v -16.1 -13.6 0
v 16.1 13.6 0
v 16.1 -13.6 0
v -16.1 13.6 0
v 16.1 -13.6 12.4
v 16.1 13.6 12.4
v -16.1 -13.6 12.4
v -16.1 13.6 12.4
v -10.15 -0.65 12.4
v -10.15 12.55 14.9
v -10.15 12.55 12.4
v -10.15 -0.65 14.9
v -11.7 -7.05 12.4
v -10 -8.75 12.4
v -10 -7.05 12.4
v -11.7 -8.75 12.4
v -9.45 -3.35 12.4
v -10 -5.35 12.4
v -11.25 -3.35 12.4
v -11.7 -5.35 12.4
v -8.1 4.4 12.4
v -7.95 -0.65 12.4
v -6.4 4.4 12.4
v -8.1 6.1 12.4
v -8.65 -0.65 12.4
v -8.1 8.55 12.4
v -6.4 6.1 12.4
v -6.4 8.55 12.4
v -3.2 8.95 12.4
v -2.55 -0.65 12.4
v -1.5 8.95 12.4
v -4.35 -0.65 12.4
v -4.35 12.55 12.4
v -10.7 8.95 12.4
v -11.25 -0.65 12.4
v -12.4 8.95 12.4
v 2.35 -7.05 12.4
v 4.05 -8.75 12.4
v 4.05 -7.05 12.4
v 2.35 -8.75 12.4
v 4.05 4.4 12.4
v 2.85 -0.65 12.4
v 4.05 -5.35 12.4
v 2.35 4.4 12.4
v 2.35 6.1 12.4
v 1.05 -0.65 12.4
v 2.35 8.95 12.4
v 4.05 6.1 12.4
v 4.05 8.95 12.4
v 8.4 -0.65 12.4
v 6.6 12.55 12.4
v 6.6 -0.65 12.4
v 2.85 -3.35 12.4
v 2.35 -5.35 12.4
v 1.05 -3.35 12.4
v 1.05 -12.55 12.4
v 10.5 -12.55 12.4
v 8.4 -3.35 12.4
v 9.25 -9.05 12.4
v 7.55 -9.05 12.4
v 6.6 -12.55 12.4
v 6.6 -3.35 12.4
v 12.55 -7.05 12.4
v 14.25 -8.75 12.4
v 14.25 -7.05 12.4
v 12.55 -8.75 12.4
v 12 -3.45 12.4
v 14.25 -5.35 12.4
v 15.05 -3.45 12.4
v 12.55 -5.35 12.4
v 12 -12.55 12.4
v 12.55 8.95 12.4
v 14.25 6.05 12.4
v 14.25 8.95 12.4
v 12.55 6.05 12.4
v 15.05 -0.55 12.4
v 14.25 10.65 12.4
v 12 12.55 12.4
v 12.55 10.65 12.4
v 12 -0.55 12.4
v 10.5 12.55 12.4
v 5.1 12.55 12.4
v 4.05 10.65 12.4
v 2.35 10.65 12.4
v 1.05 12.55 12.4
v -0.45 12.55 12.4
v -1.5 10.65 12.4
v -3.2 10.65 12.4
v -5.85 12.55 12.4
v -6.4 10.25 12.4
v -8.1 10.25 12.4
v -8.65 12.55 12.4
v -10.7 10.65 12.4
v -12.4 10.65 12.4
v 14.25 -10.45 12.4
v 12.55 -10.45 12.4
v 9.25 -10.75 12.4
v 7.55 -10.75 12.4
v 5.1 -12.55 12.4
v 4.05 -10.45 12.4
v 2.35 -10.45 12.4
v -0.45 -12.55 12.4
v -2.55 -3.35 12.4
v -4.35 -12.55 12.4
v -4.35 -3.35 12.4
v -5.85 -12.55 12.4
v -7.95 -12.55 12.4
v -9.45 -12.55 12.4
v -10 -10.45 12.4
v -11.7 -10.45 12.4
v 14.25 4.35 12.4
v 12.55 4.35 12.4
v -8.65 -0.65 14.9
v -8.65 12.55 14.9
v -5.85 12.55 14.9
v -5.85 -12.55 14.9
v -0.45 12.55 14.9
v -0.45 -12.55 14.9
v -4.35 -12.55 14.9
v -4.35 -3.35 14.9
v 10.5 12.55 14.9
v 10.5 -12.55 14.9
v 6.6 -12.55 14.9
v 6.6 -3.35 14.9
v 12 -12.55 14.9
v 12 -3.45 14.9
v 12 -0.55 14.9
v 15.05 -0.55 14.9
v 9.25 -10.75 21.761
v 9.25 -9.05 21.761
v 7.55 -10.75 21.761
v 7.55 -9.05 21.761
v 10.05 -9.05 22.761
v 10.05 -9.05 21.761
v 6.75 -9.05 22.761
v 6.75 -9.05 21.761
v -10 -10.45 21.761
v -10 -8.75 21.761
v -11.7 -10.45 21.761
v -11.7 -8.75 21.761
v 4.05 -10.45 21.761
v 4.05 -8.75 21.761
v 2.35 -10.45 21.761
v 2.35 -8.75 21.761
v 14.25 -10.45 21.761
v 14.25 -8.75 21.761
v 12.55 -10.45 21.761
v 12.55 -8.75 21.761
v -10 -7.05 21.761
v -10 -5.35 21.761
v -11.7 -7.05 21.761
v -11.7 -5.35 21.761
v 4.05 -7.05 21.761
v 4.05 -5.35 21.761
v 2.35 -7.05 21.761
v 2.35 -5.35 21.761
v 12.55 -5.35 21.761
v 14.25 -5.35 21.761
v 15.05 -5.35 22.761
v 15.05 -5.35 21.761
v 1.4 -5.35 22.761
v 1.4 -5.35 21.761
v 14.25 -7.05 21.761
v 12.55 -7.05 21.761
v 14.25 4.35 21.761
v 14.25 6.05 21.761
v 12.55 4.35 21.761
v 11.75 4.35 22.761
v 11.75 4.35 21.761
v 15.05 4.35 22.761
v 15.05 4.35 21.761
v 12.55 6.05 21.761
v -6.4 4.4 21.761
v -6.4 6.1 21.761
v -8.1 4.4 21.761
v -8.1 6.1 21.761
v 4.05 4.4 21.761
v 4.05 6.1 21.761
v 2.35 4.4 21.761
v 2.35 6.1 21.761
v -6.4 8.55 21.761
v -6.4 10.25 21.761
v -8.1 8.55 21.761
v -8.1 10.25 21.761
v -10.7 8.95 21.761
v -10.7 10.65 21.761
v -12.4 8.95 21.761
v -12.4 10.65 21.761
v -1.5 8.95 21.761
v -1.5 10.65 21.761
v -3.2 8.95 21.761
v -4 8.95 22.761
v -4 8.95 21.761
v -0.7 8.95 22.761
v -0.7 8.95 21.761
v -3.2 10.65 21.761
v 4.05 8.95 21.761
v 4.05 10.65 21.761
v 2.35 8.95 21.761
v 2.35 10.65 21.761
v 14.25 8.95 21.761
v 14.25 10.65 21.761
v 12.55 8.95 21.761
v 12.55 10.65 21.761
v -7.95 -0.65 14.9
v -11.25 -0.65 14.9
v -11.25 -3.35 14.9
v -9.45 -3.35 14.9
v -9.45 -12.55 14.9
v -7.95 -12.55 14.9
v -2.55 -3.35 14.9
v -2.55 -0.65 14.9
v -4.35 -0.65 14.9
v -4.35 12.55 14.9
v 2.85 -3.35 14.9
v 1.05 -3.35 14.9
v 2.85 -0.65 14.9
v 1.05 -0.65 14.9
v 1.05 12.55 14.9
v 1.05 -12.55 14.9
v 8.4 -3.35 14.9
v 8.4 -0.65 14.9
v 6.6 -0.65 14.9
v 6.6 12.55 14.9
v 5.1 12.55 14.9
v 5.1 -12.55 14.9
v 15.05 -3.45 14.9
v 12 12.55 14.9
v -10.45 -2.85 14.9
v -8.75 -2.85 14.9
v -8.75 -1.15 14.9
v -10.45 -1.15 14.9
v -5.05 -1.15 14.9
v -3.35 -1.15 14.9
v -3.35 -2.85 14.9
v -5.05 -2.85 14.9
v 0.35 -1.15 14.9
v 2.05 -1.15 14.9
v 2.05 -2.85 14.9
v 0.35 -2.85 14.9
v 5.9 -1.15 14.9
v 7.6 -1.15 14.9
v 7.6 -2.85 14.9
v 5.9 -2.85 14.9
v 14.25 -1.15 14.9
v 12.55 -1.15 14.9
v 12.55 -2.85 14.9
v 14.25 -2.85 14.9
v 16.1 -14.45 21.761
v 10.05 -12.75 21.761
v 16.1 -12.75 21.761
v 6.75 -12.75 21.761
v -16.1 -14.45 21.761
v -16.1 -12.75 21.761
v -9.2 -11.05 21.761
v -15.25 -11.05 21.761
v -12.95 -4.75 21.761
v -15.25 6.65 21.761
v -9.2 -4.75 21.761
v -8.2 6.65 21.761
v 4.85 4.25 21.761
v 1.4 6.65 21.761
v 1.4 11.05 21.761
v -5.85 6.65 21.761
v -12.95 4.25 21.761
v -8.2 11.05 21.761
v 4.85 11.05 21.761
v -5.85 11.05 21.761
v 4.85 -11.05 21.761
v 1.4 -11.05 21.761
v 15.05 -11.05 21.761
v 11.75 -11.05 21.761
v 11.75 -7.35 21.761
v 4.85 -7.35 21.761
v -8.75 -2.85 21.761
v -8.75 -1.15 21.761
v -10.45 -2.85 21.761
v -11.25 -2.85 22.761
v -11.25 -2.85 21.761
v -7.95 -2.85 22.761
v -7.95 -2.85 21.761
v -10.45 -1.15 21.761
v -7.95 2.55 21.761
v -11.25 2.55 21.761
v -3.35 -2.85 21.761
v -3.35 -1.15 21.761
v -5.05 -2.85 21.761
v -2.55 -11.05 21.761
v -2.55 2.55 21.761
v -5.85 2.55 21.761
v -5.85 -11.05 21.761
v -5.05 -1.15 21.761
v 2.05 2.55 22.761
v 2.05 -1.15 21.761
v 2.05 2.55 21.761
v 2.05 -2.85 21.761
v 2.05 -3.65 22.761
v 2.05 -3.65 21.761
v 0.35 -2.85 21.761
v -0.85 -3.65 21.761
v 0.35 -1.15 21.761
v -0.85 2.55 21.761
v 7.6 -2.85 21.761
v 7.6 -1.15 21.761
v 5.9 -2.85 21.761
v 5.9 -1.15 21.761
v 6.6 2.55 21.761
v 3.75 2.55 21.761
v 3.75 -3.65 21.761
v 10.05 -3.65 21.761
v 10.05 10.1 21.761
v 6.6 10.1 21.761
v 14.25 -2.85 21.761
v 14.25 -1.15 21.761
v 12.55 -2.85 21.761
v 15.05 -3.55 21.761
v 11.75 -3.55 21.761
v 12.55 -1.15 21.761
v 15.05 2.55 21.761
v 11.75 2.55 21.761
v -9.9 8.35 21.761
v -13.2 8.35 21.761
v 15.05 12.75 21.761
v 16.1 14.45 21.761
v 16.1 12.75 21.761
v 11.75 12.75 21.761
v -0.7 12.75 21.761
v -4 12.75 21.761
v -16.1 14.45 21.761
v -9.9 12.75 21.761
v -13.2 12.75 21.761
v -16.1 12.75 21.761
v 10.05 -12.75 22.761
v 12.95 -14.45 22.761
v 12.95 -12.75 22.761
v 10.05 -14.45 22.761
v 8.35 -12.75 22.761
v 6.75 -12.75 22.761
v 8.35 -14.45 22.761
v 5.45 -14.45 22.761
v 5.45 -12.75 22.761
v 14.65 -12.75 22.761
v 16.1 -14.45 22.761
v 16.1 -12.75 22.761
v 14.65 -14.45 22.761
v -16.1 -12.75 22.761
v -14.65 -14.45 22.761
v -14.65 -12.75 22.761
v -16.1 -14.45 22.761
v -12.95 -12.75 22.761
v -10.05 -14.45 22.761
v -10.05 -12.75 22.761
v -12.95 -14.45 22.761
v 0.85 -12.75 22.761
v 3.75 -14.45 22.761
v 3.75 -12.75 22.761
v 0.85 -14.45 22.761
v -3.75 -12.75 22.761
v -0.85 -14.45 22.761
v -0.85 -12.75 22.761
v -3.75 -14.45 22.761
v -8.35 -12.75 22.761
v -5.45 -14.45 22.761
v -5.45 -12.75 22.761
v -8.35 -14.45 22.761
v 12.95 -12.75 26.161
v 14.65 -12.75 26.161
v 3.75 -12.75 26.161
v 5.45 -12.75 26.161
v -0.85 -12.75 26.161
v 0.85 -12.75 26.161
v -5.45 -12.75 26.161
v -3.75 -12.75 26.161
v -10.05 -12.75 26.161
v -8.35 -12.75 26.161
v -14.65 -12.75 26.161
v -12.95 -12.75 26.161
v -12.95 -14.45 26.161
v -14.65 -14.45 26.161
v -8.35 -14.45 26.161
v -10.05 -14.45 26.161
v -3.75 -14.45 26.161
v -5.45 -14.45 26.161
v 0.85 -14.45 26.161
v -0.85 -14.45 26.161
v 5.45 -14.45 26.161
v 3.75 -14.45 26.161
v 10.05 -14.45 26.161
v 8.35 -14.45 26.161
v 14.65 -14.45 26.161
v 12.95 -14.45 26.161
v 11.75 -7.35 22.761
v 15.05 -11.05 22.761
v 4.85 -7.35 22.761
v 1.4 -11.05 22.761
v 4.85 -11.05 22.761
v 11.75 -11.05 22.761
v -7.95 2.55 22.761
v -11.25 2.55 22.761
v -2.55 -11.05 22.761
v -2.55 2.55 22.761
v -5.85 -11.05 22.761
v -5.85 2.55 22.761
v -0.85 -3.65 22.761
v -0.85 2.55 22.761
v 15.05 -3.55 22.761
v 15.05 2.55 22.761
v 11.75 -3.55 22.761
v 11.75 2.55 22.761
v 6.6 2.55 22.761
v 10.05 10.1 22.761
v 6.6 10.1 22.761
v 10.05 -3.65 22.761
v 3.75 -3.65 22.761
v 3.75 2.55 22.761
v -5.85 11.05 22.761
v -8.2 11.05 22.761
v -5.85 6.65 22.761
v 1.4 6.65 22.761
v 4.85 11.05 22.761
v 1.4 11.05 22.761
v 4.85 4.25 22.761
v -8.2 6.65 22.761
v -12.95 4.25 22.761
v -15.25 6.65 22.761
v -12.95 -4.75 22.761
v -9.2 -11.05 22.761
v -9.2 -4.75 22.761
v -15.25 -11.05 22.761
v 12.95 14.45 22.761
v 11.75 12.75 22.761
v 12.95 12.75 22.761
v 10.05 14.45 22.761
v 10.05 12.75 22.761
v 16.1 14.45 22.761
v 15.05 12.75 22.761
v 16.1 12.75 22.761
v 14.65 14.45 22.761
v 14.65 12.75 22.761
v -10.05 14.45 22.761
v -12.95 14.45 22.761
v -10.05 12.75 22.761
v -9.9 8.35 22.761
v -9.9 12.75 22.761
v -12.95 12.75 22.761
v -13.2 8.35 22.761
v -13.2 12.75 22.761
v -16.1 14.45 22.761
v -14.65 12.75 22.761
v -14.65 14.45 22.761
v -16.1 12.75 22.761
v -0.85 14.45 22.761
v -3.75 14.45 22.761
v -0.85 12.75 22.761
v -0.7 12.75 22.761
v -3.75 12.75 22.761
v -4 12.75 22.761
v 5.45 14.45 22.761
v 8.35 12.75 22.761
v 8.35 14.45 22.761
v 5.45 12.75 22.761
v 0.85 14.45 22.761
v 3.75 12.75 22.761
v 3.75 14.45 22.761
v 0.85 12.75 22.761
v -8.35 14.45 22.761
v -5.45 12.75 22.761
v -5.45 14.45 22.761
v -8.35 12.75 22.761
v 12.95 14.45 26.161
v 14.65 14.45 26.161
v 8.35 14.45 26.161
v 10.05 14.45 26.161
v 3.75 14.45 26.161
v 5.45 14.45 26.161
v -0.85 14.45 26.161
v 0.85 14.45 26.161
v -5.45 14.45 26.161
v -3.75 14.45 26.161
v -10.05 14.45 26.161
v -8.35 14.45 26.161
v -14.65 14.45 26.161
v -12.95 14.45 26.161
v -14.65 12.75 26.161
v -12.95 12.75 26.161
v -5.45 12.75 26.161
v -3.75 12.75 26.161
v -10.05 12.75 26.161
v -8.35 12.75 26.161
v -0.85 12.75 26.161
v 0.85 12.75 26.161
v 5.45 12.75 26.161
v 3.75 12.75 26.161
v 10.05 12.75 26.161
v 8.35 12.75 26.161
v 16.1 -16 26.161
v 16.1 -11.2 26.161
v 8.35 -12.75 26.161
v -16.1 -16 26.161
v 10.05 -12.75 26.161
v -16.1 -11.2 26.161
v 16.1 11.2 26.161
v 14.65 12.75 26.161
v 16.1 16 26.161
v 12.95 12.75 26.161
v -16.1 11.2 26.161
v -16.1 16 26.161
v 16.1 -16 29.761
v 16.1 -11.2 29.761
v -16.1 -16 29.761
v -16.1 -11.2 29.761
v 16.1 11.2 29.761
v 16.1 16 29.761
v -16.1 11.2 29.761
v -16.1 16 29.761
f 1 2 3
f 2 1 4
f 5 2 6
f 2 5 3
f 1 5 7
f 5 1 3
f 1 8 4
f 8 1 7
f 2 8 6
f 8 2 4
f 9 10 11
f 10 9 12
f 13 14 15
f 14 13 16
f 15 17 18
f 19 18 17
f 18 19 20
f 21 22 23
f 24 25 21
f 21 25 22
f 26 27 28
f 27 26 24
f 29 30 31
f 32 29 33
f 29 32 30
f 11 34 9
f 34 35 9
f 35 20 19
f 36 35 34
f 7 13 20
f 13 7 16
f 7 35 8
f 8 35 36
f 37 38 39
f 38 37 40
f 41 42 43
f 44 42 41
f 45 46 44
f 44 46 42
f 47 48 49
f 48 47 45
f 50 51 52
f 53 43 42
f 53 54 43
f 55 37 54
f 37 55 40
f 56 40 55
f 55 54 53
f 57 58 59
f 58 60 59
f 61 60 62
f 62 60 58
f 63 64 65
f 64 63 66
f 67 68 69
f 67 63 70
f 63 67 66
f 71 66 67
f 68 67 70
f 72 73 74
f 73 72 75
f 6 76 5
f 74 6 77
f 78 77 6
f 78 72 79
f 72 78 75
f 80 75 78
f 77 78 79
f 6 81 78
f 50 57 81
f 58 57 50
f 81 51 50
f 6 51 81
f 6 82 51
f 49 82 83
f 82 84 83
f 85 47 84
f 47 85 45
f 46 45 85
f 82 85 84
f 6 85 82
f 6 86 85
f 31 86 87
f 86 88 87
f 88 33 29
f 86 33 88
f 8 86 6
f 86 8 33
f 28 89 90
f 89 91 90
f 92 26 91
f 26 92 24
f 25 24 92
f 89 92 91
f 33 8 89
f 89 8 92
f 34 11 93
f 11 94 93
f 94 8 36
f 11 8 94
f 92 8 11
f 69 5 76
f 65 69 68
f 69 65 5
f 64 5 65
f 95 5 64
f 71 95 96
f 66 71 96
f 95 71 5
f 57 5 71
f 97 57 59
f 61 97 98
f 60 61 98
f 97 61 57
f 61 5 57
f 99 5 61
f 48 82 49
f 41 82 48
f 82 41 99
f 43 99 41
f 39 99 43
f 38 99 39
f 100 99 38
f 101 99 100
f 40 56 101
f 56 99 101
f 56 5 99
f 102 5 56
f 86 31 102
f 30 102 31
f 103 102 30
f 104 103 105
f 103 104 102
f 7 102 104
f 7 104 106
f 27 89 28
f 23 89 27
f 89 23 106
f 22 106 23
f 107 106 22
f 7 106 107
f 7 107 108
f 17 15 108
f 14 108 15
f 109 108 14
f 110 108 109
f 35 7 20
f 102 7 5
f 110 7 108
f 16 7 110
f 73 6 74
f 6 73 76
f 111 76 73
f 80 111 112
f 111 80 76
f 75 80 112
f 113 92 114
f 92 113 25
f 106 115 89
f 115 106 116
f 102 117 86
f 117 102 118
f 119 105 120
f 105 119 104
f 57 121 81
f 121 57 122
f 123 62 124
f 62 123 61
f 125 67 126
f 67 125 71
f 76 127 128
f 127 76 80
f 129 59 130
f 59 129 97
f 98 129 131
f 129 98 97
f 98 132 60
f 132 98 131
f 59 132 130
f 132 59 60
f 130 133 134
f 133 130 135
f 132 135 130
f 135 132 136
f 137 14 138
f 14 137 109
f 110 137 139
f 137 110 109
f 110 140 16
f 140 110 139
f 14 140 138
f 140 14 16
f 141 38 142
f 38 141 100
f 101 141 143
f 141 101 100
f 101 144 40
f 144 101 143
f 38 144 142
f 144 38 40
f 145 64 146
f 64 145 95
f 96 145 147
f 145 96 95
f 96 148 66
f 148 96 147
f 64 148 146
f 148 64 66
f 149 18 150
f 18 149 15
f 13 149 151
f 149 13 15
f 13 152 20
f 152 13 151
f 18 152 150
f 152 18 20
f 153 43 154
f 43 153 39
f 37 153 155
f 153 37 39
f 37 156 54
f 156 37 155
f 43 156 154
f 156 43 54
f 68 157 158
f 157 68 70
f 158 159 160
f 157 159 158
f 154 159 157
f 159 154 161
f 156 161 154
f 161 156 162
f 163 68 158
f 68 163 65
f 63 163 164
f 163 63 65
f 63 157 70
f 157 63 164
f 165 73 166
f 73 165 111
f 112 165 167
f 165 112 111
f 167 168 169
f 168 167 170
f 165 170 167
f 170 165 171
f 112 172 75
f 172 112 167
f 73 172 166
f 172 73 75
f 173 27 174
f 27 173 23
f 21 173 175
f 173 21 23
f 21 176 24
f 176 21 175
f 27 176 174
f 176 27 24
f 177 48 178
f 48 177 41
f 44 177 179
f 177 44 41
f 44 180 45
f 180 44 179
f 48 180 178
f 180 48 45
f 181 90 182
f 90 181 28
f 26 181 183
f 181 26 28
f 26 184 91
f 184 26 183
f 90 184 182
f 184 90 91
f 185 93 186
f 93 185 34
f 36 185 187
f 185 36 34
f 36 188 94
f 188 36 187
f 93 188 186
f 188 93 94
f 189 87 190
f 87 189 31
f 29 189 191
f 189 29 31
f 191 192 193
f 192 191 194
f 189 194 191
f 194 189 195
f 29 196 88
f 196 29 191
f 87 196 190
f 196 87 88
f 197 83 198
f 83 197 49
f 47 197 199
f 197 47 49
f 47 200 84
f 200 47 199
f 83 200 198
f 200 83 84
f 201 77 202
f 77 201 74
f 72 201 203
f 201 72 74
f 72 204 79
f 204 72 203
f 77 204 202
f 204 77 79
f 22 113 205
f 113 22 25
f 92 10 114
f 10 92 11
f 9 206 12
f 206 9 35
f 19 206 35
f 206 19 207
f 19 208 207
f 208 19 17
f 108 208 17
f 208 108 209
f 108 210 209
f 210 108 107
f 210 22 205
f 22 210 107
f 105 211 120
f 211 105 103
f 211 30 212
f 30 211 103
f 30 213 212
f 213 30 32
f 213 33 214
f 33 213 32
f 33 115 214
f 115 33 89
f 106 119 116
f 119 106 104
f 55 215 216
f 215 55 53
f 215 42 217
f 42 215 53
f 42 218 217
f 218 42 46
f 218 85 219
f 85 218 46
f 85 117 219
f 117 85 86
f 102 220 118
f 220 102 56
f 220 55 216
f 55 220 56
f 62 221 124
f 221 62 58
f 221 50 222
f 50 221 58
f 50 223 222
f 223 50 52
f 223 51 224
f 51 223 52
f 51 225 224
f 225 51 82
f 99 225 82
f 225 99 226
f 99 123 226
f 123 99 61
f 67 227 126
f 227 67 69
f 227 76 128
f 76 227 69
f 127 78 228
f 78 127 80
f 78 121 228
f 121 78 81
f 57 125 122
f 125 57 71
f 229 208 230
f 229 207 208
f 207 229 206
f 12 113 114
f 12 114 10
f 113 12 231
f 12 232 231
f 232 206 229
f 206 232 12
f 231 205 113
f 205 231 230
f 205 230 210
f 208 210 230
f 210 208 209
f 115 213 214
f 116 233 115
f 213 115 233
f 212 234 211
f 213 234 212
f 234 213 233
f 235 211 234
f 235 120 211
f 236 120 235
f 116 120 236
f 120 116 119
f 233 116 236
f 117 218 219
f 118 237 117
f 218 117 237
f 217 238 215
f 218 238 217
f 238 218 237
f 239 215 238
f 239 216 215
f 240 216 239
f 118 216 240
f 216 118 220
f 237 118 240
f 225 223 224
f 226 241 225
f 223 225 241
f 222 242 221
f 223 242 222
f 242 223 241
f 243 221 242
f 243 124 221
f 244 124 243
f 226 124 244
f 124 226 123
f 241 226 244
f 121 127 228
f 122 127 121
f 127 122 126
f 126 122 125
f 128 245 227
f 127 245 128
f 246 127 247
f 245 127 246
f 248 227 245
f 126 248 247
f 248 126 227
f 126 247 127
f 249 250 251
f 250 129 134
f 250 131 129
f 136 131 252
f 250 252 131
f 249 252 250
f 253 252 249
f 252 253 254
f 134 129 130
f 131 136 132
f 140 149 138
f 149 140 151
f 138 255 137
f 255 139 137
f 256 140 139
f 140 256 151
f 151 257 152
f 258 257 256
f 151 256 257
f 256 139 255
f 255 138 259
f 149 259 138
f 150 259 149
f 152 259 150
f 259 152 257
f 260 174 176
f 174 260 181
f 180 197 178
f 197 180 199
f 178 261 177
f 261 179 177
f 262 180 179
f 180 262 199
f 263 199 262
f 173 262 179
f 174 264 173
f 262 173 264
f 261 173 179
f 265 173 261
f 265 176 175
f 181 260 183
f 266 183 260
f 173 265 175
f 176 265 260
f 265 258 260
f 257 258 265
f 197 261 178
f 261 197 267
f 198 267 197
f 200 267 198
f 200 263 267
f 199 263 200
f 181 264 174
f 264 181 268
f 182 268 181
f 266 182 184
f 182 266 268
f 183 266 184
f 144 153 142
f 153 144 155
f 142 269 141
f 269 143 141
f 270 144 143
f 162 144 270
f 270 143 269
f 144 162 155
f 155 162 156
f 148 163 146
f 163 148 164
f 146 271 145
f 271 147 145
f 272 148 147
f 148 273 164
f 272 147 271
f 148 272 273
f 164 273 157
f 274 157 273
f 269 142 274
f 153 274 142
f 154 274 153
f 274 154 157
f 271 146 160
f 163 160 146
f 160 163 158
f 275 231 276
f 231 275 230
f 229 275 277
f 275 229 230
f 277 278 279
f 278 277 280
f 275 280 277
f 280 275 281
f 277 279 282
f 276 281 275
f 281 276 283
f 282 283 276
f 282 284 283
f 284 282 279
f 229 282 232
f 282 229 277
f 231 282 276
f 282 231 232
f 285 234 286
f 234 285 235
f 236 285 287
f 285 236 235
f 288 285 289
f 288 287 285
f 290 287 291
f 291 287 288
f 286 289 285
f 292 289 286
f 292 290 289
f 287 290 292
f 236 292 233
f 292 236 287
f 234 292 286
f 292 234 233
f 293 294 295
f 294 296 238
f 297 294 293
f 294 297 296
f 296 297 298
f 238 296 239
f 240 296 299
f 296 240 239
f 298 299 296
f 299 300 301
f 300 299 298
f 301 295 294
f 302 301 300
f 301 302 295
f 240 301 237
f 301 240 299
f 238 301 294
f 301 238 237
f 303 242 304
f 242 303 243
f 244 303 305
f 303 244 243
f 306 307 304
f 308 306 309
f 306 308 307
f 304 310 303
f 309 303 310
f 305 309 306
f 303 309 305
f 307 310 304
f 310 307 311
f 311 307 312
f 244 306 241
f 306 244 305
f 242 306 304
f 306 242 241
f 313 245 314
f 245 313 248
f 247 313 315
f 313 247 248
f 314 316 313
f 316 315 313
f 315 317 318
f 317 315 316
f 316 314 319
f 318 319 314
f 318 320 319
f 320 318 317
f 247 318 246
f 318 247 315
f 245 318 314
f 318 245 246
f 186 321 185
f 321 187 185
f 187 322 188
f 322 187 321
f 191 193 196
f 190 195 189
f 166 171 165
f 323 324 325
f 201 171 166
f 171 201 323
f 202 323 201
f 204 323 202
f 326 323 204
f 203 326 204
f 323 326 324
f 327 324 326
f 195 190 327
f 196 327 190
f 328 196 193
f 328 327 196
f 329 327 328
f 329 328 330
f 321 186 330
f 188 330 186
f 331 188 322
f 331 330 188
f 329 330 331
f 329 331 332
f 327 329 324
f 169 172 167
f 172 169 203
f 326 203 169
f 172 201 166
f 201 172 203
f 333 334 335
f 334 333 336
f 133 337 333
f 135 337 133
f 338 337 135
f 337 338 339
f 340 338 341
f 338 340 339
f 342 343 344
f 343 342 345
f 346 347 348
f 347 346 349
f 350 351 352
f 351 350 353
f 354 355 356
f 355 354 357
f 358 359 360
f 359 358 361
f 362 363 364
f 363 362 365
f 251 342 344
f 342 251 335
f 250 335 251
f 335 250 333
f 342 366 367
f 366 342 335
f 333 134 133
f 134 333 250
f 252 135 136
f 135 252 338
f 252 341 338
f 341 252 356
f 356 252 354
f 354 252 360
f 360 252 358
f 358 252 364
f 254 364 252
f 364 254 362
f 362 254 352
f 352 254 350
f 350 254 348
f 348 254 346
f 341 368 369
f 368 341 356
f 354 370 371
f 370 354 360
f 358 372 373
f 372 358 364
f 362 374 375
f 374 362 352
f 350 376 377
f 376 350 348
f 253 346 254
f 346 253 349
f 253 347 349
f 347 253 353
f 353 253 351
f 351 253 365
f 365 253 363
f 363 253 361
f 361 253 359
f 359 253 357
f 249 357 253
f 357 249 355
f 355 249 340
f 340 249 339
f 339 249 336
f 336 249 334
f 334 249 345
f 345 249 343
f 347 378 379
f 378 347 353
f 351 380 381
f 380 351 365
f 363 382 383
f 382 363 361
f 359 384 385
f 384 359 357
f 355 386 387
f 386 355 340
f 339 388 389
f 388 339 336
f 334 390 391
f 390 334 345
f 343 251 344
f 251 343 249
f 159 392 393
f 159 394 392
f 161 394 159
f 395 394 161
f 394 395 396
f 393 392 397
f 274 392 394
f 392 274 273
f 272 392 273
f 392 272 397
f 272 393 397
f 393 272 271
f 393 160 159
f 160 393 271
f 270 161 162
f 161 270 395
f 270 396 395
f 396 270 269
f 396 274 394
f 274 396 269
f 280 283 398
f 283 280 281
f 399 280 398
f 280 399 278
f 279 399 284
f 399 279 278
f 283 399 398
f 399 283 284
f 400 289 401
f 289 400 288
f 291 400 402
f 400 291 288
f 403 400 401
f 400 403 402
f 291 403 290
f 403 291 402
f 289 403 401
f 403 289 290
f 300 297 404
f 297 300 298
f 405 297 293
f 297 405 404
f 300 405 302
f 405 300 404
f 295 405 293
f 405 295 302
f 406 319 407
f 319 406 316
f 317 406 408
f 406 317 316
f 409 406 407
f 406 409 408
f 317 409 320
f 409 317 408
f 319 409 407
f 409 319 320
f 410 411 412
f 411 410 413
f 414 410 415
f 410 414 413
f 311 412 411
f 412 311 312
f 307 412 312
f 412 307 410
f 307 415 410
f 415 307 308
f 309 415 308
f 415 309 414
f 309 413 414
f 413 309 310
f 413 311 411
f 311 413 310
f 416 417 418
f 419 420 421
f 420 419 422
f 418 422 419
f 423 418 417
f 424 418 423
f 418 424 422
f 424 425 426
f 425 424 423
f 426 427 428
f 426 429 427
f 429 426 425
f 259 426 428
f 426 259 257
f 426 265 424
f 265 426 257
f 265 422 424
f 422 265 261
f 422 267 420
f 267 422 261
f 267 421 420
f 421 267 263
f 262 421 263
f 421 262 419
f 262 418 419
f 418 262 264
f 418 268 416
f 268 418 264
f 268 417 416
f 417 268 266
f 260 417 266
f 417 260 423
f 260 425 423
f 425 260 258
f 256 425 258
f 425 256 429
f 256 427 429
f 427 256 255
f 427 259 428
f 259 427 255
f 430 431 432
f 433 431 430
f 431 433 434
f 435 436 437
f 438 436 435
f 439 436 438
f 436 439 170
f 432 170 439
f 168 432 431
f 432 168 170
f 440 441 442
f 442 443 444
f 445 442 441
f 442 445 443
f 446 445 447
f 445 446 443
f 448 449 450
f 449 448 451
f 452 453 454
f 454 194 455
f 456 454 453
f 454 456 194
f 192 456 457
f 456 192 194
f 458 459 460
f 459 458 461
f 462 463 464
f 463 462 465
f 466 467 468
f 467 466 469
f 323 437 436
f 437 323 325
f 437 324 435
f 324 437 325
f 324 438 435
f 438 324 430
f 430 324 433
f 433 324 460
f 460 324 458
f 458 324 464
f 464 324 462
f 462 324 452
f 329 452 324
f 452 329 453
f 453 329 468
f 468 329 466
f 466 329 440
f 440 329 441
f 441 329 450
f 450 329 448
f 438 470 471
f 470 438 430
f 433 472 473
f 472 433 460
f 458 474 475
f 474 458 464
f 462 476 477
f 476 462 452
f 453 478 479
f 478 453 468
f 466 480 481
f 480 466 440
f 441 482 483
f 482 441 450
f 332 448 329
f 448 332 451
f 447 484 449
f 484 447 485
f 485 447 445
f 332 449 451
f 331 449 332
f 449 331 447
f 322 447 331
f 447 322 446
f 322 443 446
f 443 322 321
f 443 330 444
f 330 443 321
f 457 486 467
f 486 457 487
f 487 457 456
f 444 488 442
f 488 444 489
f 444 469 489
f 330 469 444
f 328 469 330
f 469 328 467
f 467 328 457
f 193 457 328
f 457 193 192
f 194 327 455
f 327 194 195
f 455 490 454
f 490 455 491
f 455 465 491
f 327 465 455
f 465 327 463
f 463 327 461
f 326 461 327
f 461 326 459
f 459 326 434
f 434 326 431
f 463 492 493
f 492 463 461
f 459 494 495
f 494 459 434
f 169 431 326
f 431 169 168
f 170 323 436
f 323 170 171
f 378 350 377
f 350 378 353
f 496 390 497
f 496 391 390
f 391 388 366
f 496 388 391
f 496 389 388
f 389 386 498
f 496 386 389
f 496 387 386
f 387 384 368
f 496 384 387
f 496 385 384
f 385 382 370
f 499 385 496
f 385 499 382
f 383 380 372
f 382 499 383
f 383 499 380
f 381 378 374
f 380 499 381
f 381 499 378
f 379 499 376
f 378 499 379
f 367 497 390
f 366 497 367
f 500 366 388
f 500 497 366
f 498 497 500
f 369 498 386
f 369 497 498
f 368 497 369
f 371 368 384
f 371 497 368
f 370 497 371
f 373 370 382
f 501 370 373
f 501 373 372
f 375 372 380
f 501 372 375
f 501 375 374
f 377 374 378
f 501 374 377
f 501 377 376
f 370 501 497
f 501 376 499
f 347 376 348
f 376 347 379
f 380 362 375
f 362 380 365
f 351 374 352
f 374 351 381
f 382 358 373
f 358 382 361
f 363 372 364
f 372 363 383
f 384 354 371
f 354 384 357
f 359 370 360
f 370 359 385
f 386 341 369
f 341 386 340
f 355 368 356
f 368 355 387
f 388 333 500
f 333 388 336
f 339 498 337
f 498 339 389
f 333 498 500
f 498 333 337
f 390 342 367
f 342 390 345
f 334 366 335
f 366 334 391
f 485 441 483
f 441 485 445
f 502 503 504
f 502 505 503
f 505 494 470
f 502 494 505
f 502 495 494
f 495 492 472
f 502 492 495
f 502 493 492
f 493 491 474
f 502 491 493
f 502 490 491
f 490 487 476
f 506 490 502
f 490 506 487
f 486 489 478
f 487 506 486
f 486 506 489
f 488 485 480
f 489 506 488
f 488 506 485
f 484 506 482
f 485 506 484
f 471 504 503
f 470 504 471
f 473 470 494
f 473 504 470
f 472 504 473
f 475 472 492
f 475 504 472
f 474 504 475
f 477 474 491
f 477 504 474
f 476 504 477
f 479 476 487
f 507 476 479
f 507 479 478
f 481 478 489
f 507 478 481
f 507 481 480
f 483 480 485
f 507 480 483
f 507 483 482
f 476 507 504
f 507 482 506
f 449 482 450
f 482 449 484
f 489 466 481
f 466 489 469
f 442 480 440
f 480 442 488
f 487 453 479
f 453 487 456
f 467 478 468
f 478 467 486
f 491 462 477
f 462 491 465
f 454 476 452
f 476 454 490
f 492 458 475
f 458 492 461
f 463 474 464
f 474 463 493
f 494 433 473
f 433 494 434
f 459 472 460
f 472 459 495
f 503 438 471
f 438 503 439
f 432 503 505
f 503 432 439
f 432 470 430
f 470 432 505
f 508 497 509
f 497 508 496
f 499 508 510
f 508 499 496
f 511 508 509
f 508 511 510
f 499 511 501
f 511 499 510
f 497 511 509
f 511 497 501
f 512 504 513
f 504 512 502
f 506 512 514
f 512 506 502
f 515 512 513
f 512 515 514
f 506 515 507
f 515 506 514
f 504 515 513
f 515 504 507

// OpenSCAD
// Generated by SolidPython 0.4.2 on 2020-09-29 23:21:39
//!OpenSCAD

scale(v = 0.0100000000) {
	translate(v = [-1610, -1360, 0]) {
		union() {
			color(c = [0.4000000000, 0.4000000000, 0.4000000000]) {
				translate(v = [0, 0, 0]) {
					linear_extrude(height = 1000.0000000000) {
						polygon(paths = [[0, 1, 2, 3]], points = [[0, 0], [0, 2720], [3220, 2720], [3220, 0]]);
					}
				}
			}
			color(c = [0.2000000000, 0.6000000000, 0.2000000000]) {
				translate(v = [0, 0, 1000.0000000000]) {
					linear_extrude(height = 120.0000000000) {
						polygon(paths = [[0, 1, 2, 3]], points = [[0, 1305], [0, 2720], [3220, 2720], [3220, 1305]]);
					}
				}
			}
			color(c = [0.4000000000, 0.4000000000, 0.4000000000]) {
				translate(v = [0, 0, 1000.0000000000]) {
					linear_extrude(height = 120.0000000000) {
						polygon(paths = [[0, 1, 2, 3]], points = [[0, 0], [0, 1305], [3220, 1305], [3220, 0]]);
					}
				}
			}
			color(c = [0.9000000000, 0.6000000000, 0.6000000000]) {
				translate(v = [0, 0, 1120.0000000000]) {
					linear_extrude(height = 120.0000000000) {
						polygon(paths = [[0, 1, 2, 3]], points = [[330, 1485], [330, 2485], [595, 2485], [595, 1485]]);
					}
				}
			}
			color(c = [0.9000000000, 0.6000000000, 0.6000000000]) {
				translate(v = [0, 0, 1120.0000000000]) {
					linear_extrude(height = 120.0000000000) {
						polygon(paths = [[0, 1, 2, 3]], points = [[745, 1485], [745, 2485], [1025, 2485], [1025, 1485]]);
					}
				}
			}
			color(c = [0.9000000000, 0.6000000000, 0.6000000000]) {
				translate(v = [0, 0, 1120.0000000000]) {
					linear_extrude(height = 120.0000000000) {
						polygon(paths = [[0, 1, 2, 3]], points = [[1175, 1485], [1175, 2485], [1565, 2485], [1565, 1485]]);
					}
				}
			}
			color(c = [0.9000000000, 0.6000000000, 0.6000000000]) {
				translate(v = [0, 0, 1120.0000000000]) {
					linear_extrude(height = 120.0000000000) {
						polygon(paths = [[0, 1, 2, 3]], points = [[1715, 1485], [1715, 2485], [2120, 2485], [2120, 1485]]);
					}
				}
			}
			color(c = [0.9000000000, 0.6000000000, 0.6000000000]) {
				translate(v = [0, 0, 1120.0000000000]) {
					linear_extrude(height = 120.0000000000) {
						polygon(paths = [[0, 1, 2, 3]], points = [[2270, 1485], [2270, 2485], [2660, 2485], [2660, 1485]]);
					}
				}
			}
			color(c = [0.9000000000, 0.6000000000, 0.6000000000]) {
				translate(v = [0, 0, 1120.0000000000]) {
					linear_extrude(height = 120.0000000000) {
						polygon(paths = [[0, 1, 2, 3]], points = [[2810, 1485], [2810, 2485], [3075, 2485], [3075, 1485]]);
					}
				}
			}
			color(c = [0.9000000000, 0.6000000000, 0.9000000000]) {
				translate(v = [0, 0, 1120.0000000000]) {
					linear_extrude(height = 120.0000000000) {
						polygon(paths = [[0, 1, 2, 3]], points = [[400, 235], [400, 885], [665, 885], [665, 235]]);
					}
				}
			}
			color(c = [0.9000000000, 0.6000000000, 0.9000000000]) {
				translate(v = [0, 0, 1120.0000000000]) {
					linear_extrude(height = 120.0000000000) {
						polygon(paths = [[0, 1, 2, 3]], points = [[815, 235], [815, 885], [1025, 885], [1025, 235]]);
					}
				}
			}
			color(c = [0.9000000000, 0.6000000000, 0.9000000000]) {
				translate(v = [0, 0, 1120.0000000000]) {
					linear_extrude(height = 120.0000000000) {
						polygon(paths = [[0, 1, 2, 3]], points = [[1175, 235], [1175, 885], [1565, 885], [1565, 235]]);
					}
				}
			}
			color(c = [0.9000000000, 0.6000000000, 0.9000000000]) {
				translate(v = [0, 0, 1120.0000000000]) {
					linear_extrude(height = 120.0000000000) {
						polygon(paths = [[0, 1, 2, 3]], points = [[1715, 235], [1715, 885], [2120, 885], [2120, 235]]);
					}
				}
			}
			color(c = [0.9000000000, 0.6000000000, 0.9000000000]) {
				translate(v = [0, 0, 1120.0000000000]) {
					linear_extrude(height = 120.0000000000) {
						polygon(paths = [[0, 1, 2, 3]], points = [[2270, 235], [2270, 885], [2660, 885], [2660, 235]]);
					}
				}
			}
			color(c = [0.9000000000, 0.6000000000, 0.9000000000]) {
				translate(v = [0, 0, 1120.0000000000]) {
					linear_extrude(height = 120.0000000000) {
						polygon(paths = [[0, 1, 2, 3]], points = [[2810, 235], [2810, 885], [3075, 885], [3075, 235]]);
					}
				}
			}
			color(c = [0.2000000000, 0.6000000000, 0.2000000000]) {
				translate(v = [0, 0, 1120.0000000000]) {
					linear_extrude(height = 120.0000000000) {
						difference() {
							polygon(paths = [[0, 1, 2, 3]], points = [[0, 1305], [0, 2720], [3220, 2720], [3220, 1305]]);
							polygon(paths = [[0, 1, 2, 3]], points = [[330, 1485], [595, 1485], [595, 2485], [330, 2485]]);
							polygon(paths = [[0, 1, 2, 3]], points = [[745, 1485], [1025, 1485], [1025, 2485], [745, 2485]]);
							polygon(paths = [[0, 1, 2, 3]], points = [[1175, 1485], [1565, 1485], [1565, 2485], [1175, 2485]]);
							polygon(paths = [[0, 1, 2, 3]], points = [[1715, 1485], [2120, 1485], [2120, 2485], [1715, 2485]]);
							polygon(paths = [[0, 1, 2, 3]], points = [[2270, 1485], [2660, 1485], [2660, 2485], [2270, 2485]]);
							polygon(paths = [[0, 1, 2, 3]], points = [[2810, 1485], [3075, 1485], [3075, 2485], [2810, 2485]]);
						}
					}
				}
			}
			color(c = [0.4000000000, 0.4000000000, 0.4000000000]) {
				translate(v = [0, 0, 1120.0000000000]) {
					linear_extrude(height = 120.0000000000) {
						difference() {
							polygon(paths = [[0, 1, 2, 3]], points = [[0, 0], [0, 1305], [3220, 1305], [3220, 0]]);
							polygon(paths = [[0, 1, 2, 3]], points = [[400, 235], [665, 235], [665, 885], [400, 885]]);
							polygon(paths = [[0, 1, 2, 3]], points = [[815, 235], [1025, 235], [1025, 885], [815, 885]]);
							polygon(paths = [[0, 1, 2, 3]], points = [[1175, 235], [1565, 235], [1565, 885], [1175, 885]]);
							polygon(paths = [[0, 1, 2, 3]], points = [[1715, 235], [2120, 235], [2120, 885], [1715, 885]]);
							polygon(paths = [[0, 1, 2, 3]], points = [[2270, 235], [2660, 235], [2660, 885], [2270, 885]]);
							polygon(paths = [[0, 1, 2, 3]], points = [[2810, 235], [3075, 235], [3075, 885], [2810, 885]]);
						}
					}
				}
			}
			color(c = [0.1000000000, 0.1000000000, 0.1000000000]) {
				translate(v = [0, 0, 1240.0000000000]) {
					linear_extrude(height = 70.0000000000) {
						polygon(paths = [[0, 1, 2, 3]], points = [[2365, 285], [2365, 455], [2535, 455], [2535, 285]]);
					}
				}
			}
			color(c = [0.1000000000, 0.1000000000, 0.1000000000]) {
				translate(v = [0, 0, 1240.0000000000]) {
					linear_extrude(height = 70.0000000000) {
						polygon(paths = [[0, 1, 2, 3]], points = [[440, 315], [440, 485], [610, 485], [610, 315]]);
					}
				}
			}
			color(c = [0.1000000000, 0.1000000000, 0.1000000000]) {
				translate(v = [0, 0, 1240.0000000000]) {
					linear_extrude(height = 70.0000000000) {
						polygon(paths = [[0, 1, 2, 3]], points = [[1845, 315], [1845, 485], [2015, 485], [2015, 315]]);
					}
				}
			}
			color(c = [0.1000000000, 0.1000000000, 0.1000000000]) {
				translate(v = [0, 0, 1240.0000000000]) {
					linear_extrude(height = 70.0000000000) {
						polygon(paths = [[0, 1, 2, 3]], points = [[2865, 315], [2865, 485], [3035, 485], [3035, 315]]);
					}
				}
			}
			color(c = [0.1000000000, 0.1000000000, 0.1000000000]) {
				translate(v = [0, 0, 1240.0000000000]) {
					linear_extrude(height = 70.0000000000) {
						polygon(paths = [[0, 1, 2, 3]], points = [[440, 655], [440, 825], [610, 825], [610, 655]]);
					}
				}
			}
			color(c = [0.1000000000, 0.1000000000, 0.1000000000]) {
				translate(v = [0, 0, 1240.0000000000]) {
					linear_extrude(height = 70.0000000000) {
						polygon(paths = [[0, 1, 2, 3]], points = [[1845, 655], [1845, 825], [2015, 825], [2015, 655]]);
					}
				}
			}
			color(c = [0.1000000000, 0.1000000000, 0.1000000000]) {
				translate(v = [0, 0, 1240.0000000000]) {
					linear_extrude(height = 70.0000000000) {
						polygon(paths = [[0, 1, 2, 3]], points = [[2865, 655], [2865, 825], [3035, 825], [3035, 655]]);
					}
				}
			}
			color(c = [0.1000000000, 0.1000000000, 0.1000000000]) {
				translate(v = [0, 0, 1240.0000000000]) {
					linear_extrude(height = 70.0000000000) {
						polygon(paths = [[0, 1, 2, 3]], points = [[2865, 1795], [2865, 1965], [3035, 1965], [3035, 1795]]);
					}
				}
			}
			color(c = [0.1000000000, 0.1000000000, 0.1000000000]) {
				translate(v = [0, 0, 1240.0000000000]) {
					linear_extrude(height = 70.0000000000) {
						polygon(paths = [[0, 1, 2, 3]], points = [[800, 1800], [800, 1970], [970, 1970], [970, 1800]]);
					}
				}
			}
			color(c = [0.1000000000, 0.1000000000, 0.1000000000]) {
				translate(v = [0, 0, 1240.0000000000]) {
					linear_extrude(height = 70.0000000000) {
						polygon(paths = [[0, 1, 2, 3]], points = [[1845, 1800], [1845, 1970], [2015, 1970], [2015, 1800]]);
					}
				}
			}
			color(c = [0.1000000000, 0.1000000000, 0.1000000000]) {
				translate(v = [0, 0, 1240.0000000000]) {
					linear_extrude(height = 70.0000000000) {
						polygon(paths = [[0, 1, 2, 3]], points = [[800, 2215], [800, 2385], [970, 2385], [970, 2215]]);
					}
				}
			}
			color(c = [0.1000000000, 0.1000000000, 0.1000000000]) {
				translate(v = [0, 0, 1240.0000000000]) {
					linear_extrude(height = 70.0000000000) {
						polygon(paths = [[0, 1, 2, 3]], points = [[370, 2255], [370, 2425], [540, 2425], [540, 2255]]);
					}
				}
			}
			color(c = [0.1000000000, 0.1000000000, 0.1000000000]) {
				translate(v = [0, 0, 1240.0000000000]) {
					linear_extrude(height = 70.0000000000) {
						polygon(paths = [[0, 1, 2, 3]], points = [[1290, 2255], [1290, 2425], [1460, 2425], [1460, 2255]]);
					}
				}
			}
			color(c = [0.1000000000, 0.1000000000, 0.1000000000]) {
				translate(v = [0, 0, 1240.0000000000]) {
					linear_extrude(height = 70.0000000000) {
						polygon(paths = [[0, 1, 2, 3]], points = [[1845, 2255], [1845, 2425], [2015, 2425], [2015, 2255]]);
					}
				}
			}
			color(c = [0.1000000000, 0.1000000000, 0.1000000000]) {
				translate(v = [0, 0, 1240.0000000000]) {
					linear_extrude(height = 70.0000000000) {
						polygon(paths = [[0, 1, 2, 3]], points = [[2865, 2255], [2865, 2425], [3035, 2425], [3035, 2255]]);
					}
				}
			}
			color(c = [1.0000000000, 1.0000000000, 1.0000000000]) {
				translate(v = [0, 0, 1240.0000000000]) {
					linear_extrude(height = 70.0000000000) {
						polygon(paths = [[0, 1, 2, 3, 4, 5, 6, 7, 8, 9]], points = [[665, 105], [665, 1025], [485, 1025], [485, 1295], [595, 1295], [595, 2615], [745, 2615], [745, 1295], [815, 1295], [815, 105]]);
					}
				}
			}
			color(c = [1.0000000000, 1.0000000000, 1.0000000000]) {
				translate(v = [0, 0, 1240.0000000000]) {
					linear_extrude(height = 70.0000000000) {
						polygon(paths = [[0, 1, 2, 3, 4, 5, 6, 7]], points = [[1025, 105], [1025, 2615], [1175, 2615], [1175, 1295], [1355, 1295], [1355, 1025], [1175, 1025], [1175, 105]]);
					}
				}
			}
			color(c = [1.0000000000, 1.0000000000, 1.0000000000]) {
				translate(v = [0, 0, 1240.0000000000]) {
					linear_extrude(height = 70.0000000000) {
						polygon(paths = [[0, 1, 2, 3, 4, 5, 6, 7]], points = [[1565, 105], [1565, 2615], [1715, 2615], [1715, 1295], [1895, 1295], [1895, 1025], [1715, 1025], [1715, 105]]);
					}
				}
			}
			color(c = [1.0000000000, 1.0000000000, 1.0000000000]) {
				translate(v = [0, 0, 1240.0000000000]) {
					linear_extrude(height = 70.0000000000) {
						polygon(paths = [[0, 1, 2, 3, 4, 5, 6, 7]], points = [[2120, 105], [2120, 2615], [2270, 2615], [2270, 1295], [2450, 1295], [2450, 1025], [2270, 1025], [2270, 105]]);
					}
				}
			}
			color(c = [1.0000000000, 1.0000000000, 1.0000000000]) {
				translate(v = [0, 0, 1240.0000000000]) {
					linear_extrude(height = 70.0000000000) {
						polygon(paths = [[0, 1, 2, 3, 4, 5, 6, 7]], points = [[2660, 105], [2660, 2615], [2810, 2615], [2810, 1305], [3115, 1305], [3115, 1015], [2810, 1015], [2810, 105]]);
					}
				}
			}
			color(c = [0.1000000000, 0.1000000000, 0.1000000000]) {
				translate(v = [0, 0, 1310.0000000000]) {
					linear_extrude(height = 180.0000000000) {
						polygon(paths = [[0, 1, 2, 3]], points = [[2365, 285], [2365, 455], [2535, 455], [2535, 285]]);
					}
				}
			}
			color(c = [0.1000000000, 0.1000000000, 0.1000000000]) {
				translate(v = [0, 0, 1310.0000000000]) {
					linear_extrude(height = 180.0000000000) {
						polygon(paths = [[0, 1, 2, 3]], points = [[440, 315], [440, 485], [610, 485], [610, 315]]);
					}
				}
			}
			color(c = [0.1000000000, 0.1000000000, 0.1000000000]) {
				translate(v = [0, 0, 1310.0000000000]) {
					linear_extrude(height = 180.0000000000) {
						polygon(paths = [[0, 1, 2, 3]], points = [[1845, 315], [1845, 485], [2015, 485], [2015, 315]]);
					}
				}
			}
			color(c = [0.1000000000, 0.1000000000, 0.1000000000]) {
				translate(v = [0, 0, 1310.0000000000]) {
					linear_extrude(height = 180.0000000000) {
						polygon(paths = [[0, 1, 2, 3]], points = [[2865, 315], [2865, 485], [3035, 485], [3035, 315]]);
					}
				}
			}
			color(c = [0.1000000000, 0.1000000000, 0.1000000000]) {
				translate(v = [0, 0, 1310.0000000000]) {
					linear_extrude(height = 180.0000000000) {
						polygon(paths = [[0, 1, 2, 3]], points = [[440, 655], [440, 825], [610, 825], [610, 655]]);
					}
				}
			}
			color(c = [0.1000000000, 0.1000000000, 0.1000000000]) {
				translate(v = [0, 0, 1310.0000000000]) {
					linear_extrude(height = 180.0000000000) {
						polygon(paths = [[0, 1, 2, 3]], points = [[1845, 655], [1845, 825], [2015, 825], [2015, 655]]);
					}
				}
			}
			color(c = [0.1000000000, 0.1000000000, 0.1000000000]) {
				translate(v = [0, 0, 1310.0000000000]) {
					linear_extrude(height = 180.0000000000) {
						polygon(paths = [[0, 1, 2, 3]], points = [[2865, 655], [2865, 825], [3035, 825], [3035, 655]]);
					}
				}
			}
			color(c = [0.1000000000, 0.1000000000, 0.1000000000]) {
				translate(v = [0, 0, 1310.0000000000]) {
					linear_extrude(height = 180.0000000000) {
						polygon(paths = [[0, 1, 2, 3]], points = [[2865, 1795], [2865, 1965], [3035, 1965], [3035, 1795]]);
					}
				}
			}
			color(c = [0.1000000000, 0.1000000000, 0.1000000000]) {
				translate(v = [0, 0, 1310.0000000000]) {
					linear_extrude(height = 180.0000000000) {
						polygon(paths = [[0, 1, 2, 3]], points = [[800, 1800], [800, 1970], [970, 1970], [970, 1800]]);
					}
				}
			}
			color(c = [0.1000000000, 0.1000000000, 0.1000000000]) {
				translate(v = [0, 0, 1310.0000000000]) {
					linear_extrude(height = 180.0000000000) {
						polygon(paths = [[0, 1, 2, 3]], points = [[1845, 1800], [1845, 1970], [2015, 1970], [2015, 1800]]);
					}
				}
			}
			color(c = [0.1000000000, 0.1000000000, 0.1000000000]) {
				translate(v = [0, 0, 1310.0000000000]) {
					linear_extrude(height = 180.0000000000) {
						polygon(paths = [[0, 1, 2, 3]], points = [[800, 2215], [800, 2385], [970, 2385], [970, 2215]]);
					}
				}
			}
			color(c = [0.1000000000, 0.1000000000, 0.1000000000]) {
				translate(v = [0, 0, 1310.0000000000]) {
					linear_extrude(height = 180.0000000000) {
						polygon(paths = [[0, 1, 2, 3]], points = [[370, 2255], [370, 2425], [540, 2425], [540, 2255]]);
					}
				}
			}
			color(c = [0.1000000000, 0.1000000000, 0.1000000000]) {
				translate(v = [0, 0, 1310.0000000000]) {
					linear_extrude(height = 180.0000000000) {
						polygon(paths = [[0, 1, 2, 3]], points = [[1290, 2255], [1290, 2425], [1460, 2425], [1460, 2255]]);
					}
				}
			}
			color(c = [0.1000000000, 0.1000000000, 0.1000000000]) {
				translate(v = [0, 0, 1310.0000000000]) {
					linear_extrude(height = 180.0000000000) {
						polygon(paths = [[0, 1, 2, 3]], points = [[1845, 2255], [1845, 2425], [2015, 2425], [2015, 2255]]);
					}
				}
			}
			color(c = [0.1000000000, 0.1000000000, 0.1000000000]) {
				translate(v = [0, 0, 1310.0000000000]) {
					linear_extrude(height = 180.0000000000) {
						polygon(paths = [[0, 1, 2, 3]], points = [[2865, 2255], [2865, 2425], [3035, 2425], [3035, 2255]]);
					}
				}
			}
			color(c = [0.7000000000, 0, 0]) {
				translate(v = [0, 0, 1310.0000000000]) {
					linear_extrude(height = 180.0000000000) {
						polygon(paths = [[0, 1, 2, 3, 4, 5, 6, 7, 8, 9]], points = [[665, 105], [665, 1025], [485, 1025], [485, 1295], [595, 1295], [595, 2615], [745, 2615], [745, 1295], [815, 1295], [815, 105]]);
					}
				}
			}
			color(c = [0.7000000000, 0, 0]) {
				translate(v = [0, 0, 1310.0000000000]) {
					linear_extrude(height = 180.0000000000) {
						polygon(paths = [[0, 1, 2, 3, 4, 5, 6, 7]], points = [[1025, 105], [1025, 2615], [1175, 2615], [1175, 1295], [1355, 1295], [1355, 1025], [1175, 1025], [1175, 105]]);
					}
				}
			}
			color(c = [0.7000000000, 0, 0]) {
				translate(v = [0, 0, 1310.0000000000]) {
					linear_extrude(height = 180.0000000000) {
						polygon(paths = [[0, 1, 2, 3, 4, 5, 6, 7]], points = [[1565, 105], [1565, 2615], [1715, 2615], [1715, 1295], [1895, 1295], [1895, 1025], [1715, 1025], [1715, 105]]);
					}
				}
			}
			color(c = [0.7000000000, 0, 0]) {
				translate(v = [0, 0, 1310.0000000000]) {
					linear_extrude(height = 180.0000000000) {
						polygon(paths = [[0, 1, 2, 3, 4, 5, 6, 7]], points = [[2120, 105], [2120, 2615], [2270, 2615], [2270, 1295], [2450, 1295], [2450, 1025], [2270, 1025], [2270, 105]]);
					}
				}
			}
			color(c = [0.7000000000, 0, 0]) {
				translate(v = [0, 0, 1310.0000000000]) {
					linear_extrude(height = 180.0000000000) {
						polygon(paths = [[0, 1, 2, 3, 4, 5, 6, 7]], points = [[2660, 105], [2660, 2615], [2810, 2615], [2810, 1305], [3115, 1305], [3115, 1015], [2810, 1015], [2810, 105]]);
					}
				}
			}
			color(c = [0.1000000000, 0.1000000000, 0.1000000000]) {
				translate(v = [0, 0, 1490.0000000000]) {
					linear_extrude(height = 686.1000000000) {
						polygon(paths = [[0, 1, 2, 3]], points = [[2365, 285], [2365, 455], [2535, 455], [2535, 285]]);
					}
				}
			}
			color(c = [0.1000000000, 0.1000000000, 0.1000000000]) {
				translate(v = [0, 0, 1490.0000000000]) {
					linear_extrude(height = 686.1000000000) {
						polygon(paths = [[0, 1, 2, 3]], points = [[440, 315], [440, 485], [610, 485], [610, 315]]);
					}
				}
			}
			color(c = [0.1000000000, 0.1000000000, 0.1000000000]) {
				translate(v = [0, 0, 1490.0000000000]) {
					linear_extrude(height = 686.1000000000) {
						polygon(paths = [[0, 1, 2, 3]], points = [[1845, 315], [1845, 485], [2015, 485], [2015, 315]]);
					}
				}
			}
			color(c = [0.1000000000, 0.1000000000, 0.1000000000]) {
				translate(v = [0, 0, 1490.0000000000]) {
					linear_extrude(height = 686.1000000000) {
						polygon(paths = [[0, 1, 2, 3]], points = [[2865, 315], [2865, 485], [3035, 485], [3035, 315]]);
					}
				}
			}
			color(c = [0.1000000000, 0.1000000000, 0.1000000000]) {
				translate(v = [0, 0, 1490.0000000000]) {
					linear_extrude(height = 686.1000000000) {
						polygon(paths = [[0, 1, 2, 3]], points = [[440, 655], [440, 825], [610, 825], [610, 655]]);
					}
				}
			}
			color(c = [0.1000000000, 0.1000000000, 0.1000000000]) {
				translate(v = [0, 0, 1490.0000000000]) {
					linear_extrude(height = 686.1000000000) {
						polygon(paths = [[0, 1, 2, 3]], points = [[1845, 655], [1845, 825], [2015, 825], [2015, 655]]);
					}
				}
			}
			color(c = [0.1000000000, 0.1000000000, 0.1000000000]) {
				translate(v = [0, 0, 1490.0000000000]) {
					linear_extrude(height = 686.1000000000) {
						polygon(paths = [[0, 1, 2, 3]], points = [[2865, 655], [2865, 825], [3035, 825], [3035, 655]]);
					}
				}
			}
			color(c = [0.1000000000, 0.1000000000, 0.1000000000]) {
				translate(v = [0, 0, 1490.0000000000]) {
					linear_extrude(height = 686.1000000000) {
						polygon(paths = [[0, 1, 2, 3]], points = [[565, 1075], [565, 1245], [735, 1245], [735, 1075]]);
					}
				}
			}
			color(c = [0.1000000000, 0.1000000000, 0.1000000000]) {
				translate(v = [0, 0, 1490.0000000000]) {
					linear_extrude(height = 686.1000000000) {
						polygon(paths = [[0, 1, 2, 3]], points = [[1105, 1075], [1105, 1245], [1275, 1245], [1275, 1075]]);
					}
				}
			}
			color(c = [0.1000000000, 0.1000000000, 0.1000000000]) {
				translate(v = [0, 0, 1490.0000000000]) {
					linear_extrude(height = 686.1000000000) {
						polygon(paths = [[0, 1, 2, 3]], points = [[1645, 1075], [1645, 1245], [1815, 1245], [1815, 1075]]);
					}
				}
			}
			color(c = [0.1000000000, 0.1000000000, 0.1000000000]) {
				translate(v = [0, 0, 1490.0000000000]) {
					linear_extrude(height = 686.1000000000) {
						polygon(paths = [[0, 1, 2, 3]], points = [[2200, 1075], [2200, 1245], [2370, 1245], [2370, 1075]]);
					}
				}
			}
			color(c = [0.1000000000, 0.1000000000, 0.1000000000]) {
				translate(v = [0, 0, 1490.0000000000]) {
					linear_extrude(height = 686.1000000000) {
						polygon(paths = [[0, 1, 2, 3]], points = [[2865, 1075], [2865, 1245], [3035, 1245], [3035, 1075]]);
					}
				}
			}
			color(c = [0.1000000000, 0.1000000000, 0.1000000000]) {
				translate(v = [0, 0, 1490.0000000000]) {
					linear_extrude(height = 686.1000000000) {
						polygon(paths = [[0, 1, 2, 3]], points = [[2865, 1795], [2865, 1965], [3035, 1965], [3035, 1795]]);
					}
				}
			}
			color(c = [0.1000000000, 0.1000000000, 0.1000000000]) {
				translate(v = [0, 0, 1490.0000000000]) {
					linear_extrude(height = 686.1000000000) {
						polygon(paths = [[0, 1, 2, 3]], points = [[800, 1800], [800, 1970], [970, 1970], [970, 1800]]);
					}
				}
			}
			color(c = [0.1000000000, 0.1000000000, 0.1000000000]) {
				translate(v = [0, 0, 1490.0000000000]) {
					linear_extrude(height = 686.1000000000) {
						polygon(paths = [[0, 1, 2, 3]], points = [[1845, 1800], [1845, 1970], [2015, 1970], [2015, 1800]]);
					}
				}
			}
			color(c = [0.1000000000, 0.1000000000, 0.1000000000]) {
				translate(v = [0, 0, 1490.0000000000]) {
					linear_extrude(height = 686.1000000000) {
						polygon(paths = [[0, 1, 2, 3]], points = [[800, 2215], [800, 2385], [970, 2385], [970, 2215]]);
					}
				}
			}
			color(c = [0.1000000000, 0.1000000000, 0.1000000000]) {
				translate(v = [0, 0, 1490.0000000000]) {
					linear_extrude(height = 686.1000000000) {
						polygon(paths = [[0, 1, 2, 3]], points = [[370, 2255], [370, 2425], [540, 2425], [540, 2255]]);
					}
				}
			}
			color(c = [0.1000000000, 0.1000000000, 0.1000000000]) {
				translate(v = [0, 0, 1490.0000000000]) {
					linear_extrude(height = 686.1000000000) {
						polygon(paths = [[0, 1, 2, 3]], points = [[1290, 2255], [1290, 2425], [1460, 2425], [1460, 2255]]);
					}
				}
			}
			color(c = [0.1000000000, 0.1000000000, 0.1000000000]) {
				translate(v = [0, 0, 1490.0000000000]) {
					linear_extrude(height = 686.1000000000) {
						polygon(paths = [[0, 1, 2, 3]], points = [[1845, 2255], [1845, 2425], [2015, 2425], [2015, 2255]]);
					}
				}
			}
			color(c = [0.1000000000, 0.1000000000, 0.1000000000]) {
				translate(v = [0, 0, 1490.0000000000]) {
					linear_extrude(height = 686.1000000000) {
						polygon(paths = [[0, 1, 2, 3]], points = [[2865, 2255], [2865, 2425], [3035, 2425], [3035, 2255]]);
					}
				}
			}
			color(c = [0.9000000000, 0.6000000000, 0.6000000000]) {
				translate(v = [0, 0, 2176.1000000000]) {
					linear_extrude(height = 100.0000000000) {
						polygon(paths = [[0, 1, 2, 3, 4, 5, 6, 7]], points = [[0, -85], [0, 85], [2285, 85], [2285, 455], [2615, 455], [2615, 85], [3220, 85], [3220, -85]]);
					}
				}
			}
			color(c = [0.9000000000, 0.6000000000, 0.6000000000]) {
				translate(v = [0, 0, 2176.1000000000]) {
					linear_extrude(height = 100.0000000000) {
						polygon(paths = [[0, 1, 2, 3, 4, 5, 6, 7]], points = [[1750, 255], [1750, 825], [3115, 825], [3115, 255], [2785, 255], [2785, 625], [2095, 625], [2095, 255]]);
					}
				}
			}
			color(c = [0.9000000000, 0.6000000000, 0.6000000000]) {
				translate(v = [0, 0, 2176.1000000000]) {
					linear_extrude(height = 100.0000000000) {
						polygon(paths = [[0, 1, 2, 3]], points = [[485, 1075], [485, 1615], [815, 1615], [815, 1075]]);
					}
				}
			}
			color(c = [0.9000000000, 0.6000000000, 0.6000000000]) {
				translate(v = [0, 0, 2176.1000000000]) {
					linear_extrude(height = 100.0000000000) {
						polygon(paths = [[0, 1, 2, 3]], points = [[1025, 255], [1025, 1615], [1355, 1615], [1355, 255]]);
					}
				}
			}
			color(c = [0.9000000000, 0.6000000000, 0.6000000000]) {
				translate(v = [0, 0, 2176.1000000000]) {
					linear_extrude(height = 100.0000000000) {
						polygon(paths = [[0, 1, 2, 3]], points = [[1525, 995], [1525, 1615], [1815, 1615], [1815, 995]]);
					}
				}
			}
			color(c = [0.9000000000, 0.6000000000, 0.6000000000]) {
				translate(v = [0, 0, 2176.1000000000]) {
					linear_extrude(height = 100.0000000000) {
						polygon(paths = [[0, 1, 2, 3]], points = [[2785, 1005], [2785, 1615], [3115, 1615], [3115, 1005]]);
					}
				}
			}
			color(c = [0.9000000000, 0.6000000000, 0.6000000000]) {
				translate(v = [0, 0, 2176.1000000000]) {
					linear_extrude(height = 100.0000000000) {
						polygon(paths = [[0, 1, 2, 3, 4, 5]], points = [[1985, 995], [1985, 1615], [2270, 1615], [2270, 2370], [2615, 2370], [2615, 995]]);
					}
				}
			}
			color(c = [0.9000000000, 0.6000000000, 0.6000000000]) {
				translate(v = [0, 0, 2176.1000000000]) {
					linear_extrude(height = 100.0000000000) {
						polygon(paths = [[0, 1, 2, 3, 4, 5, 6, 7, 8, 9, 10, 11, 12, 13]], points = [[85, 255], [85, 2025], [790, 2025], [790, 2465], [1025, 2465], [1025, 2025], [1750, 2025], [1750, 2465], [2095, 2465], [2095, 1785], [315, 1785], [315, 885], [690, 885], [690, 255]]);
					}
				}
			}
			color(c = [0.9000000000, 0.6000000000, 0.6000000000]) {
				translate(v = [0, 0, 2176.1000000000]) {
					linear_extrude(height = 100.0000000000) {
						polygon(paths = [[0, 1, 2, 3, 4, 5, 6, 7, 8, 9, 10, 11, 12, 13, 14, 15]], points = [[2785, 1795], [2785, 2635], [1540, 2635], [1540, 2255], [1210, 2255], [1210, 2635], [620, 2635], [620, 2195], [290, 2195], [290, 2635], [0, 2635], [0, 2805], [3220, 2805], [3220, 2635], [3115, 2635], [3115, 1795]]);
					}
				}
			}
			color(c = [0.5000000000, 0.5000000000, 0.5000000000]) {
				translate(v = [0, 0, 2276.1000000000]) {
					linear_extrude(height = 340.0000000000) {
						polygon(paths = [[0, 1, 2, 3]], points = [[145, -85], [145, 85], [315, 85], [315, -85]]);
					}
				}
			}
			color(c = [0.5000000000, 0.5000000000, 0.5000000000]) {
				translate(v = [0, 0, 2276.1000000000]) {
					linear_extrude(height = 340.0000000000) {
						polygon(paths = [[0, 1, 2, 3]], points = [[605, -85], [605, 85], [775, 85], [775, -85]]);
					}
				}
			}
			color(c = [0.5000000000, 0.5000000000, 0.5000000000]) {
				translate(v = [0, 0, 2276.1000000000]) {
					linear_extrude(height = 340.0000000000) {
						polygon(paths = [[0, 1, 2, 3]], points = [[1065, -85], [1065, 85], [1235, 85], [1235, -85]]);
					}
				}
			}
			color(c = [0.5000000000, 0.5000000000, 0.5000000000]) {
				translate(v = [0, 0, 2276.1000000000]) {
					linear_extrude(height = 340.0000000000) {
						polygon(paths = [[0, 1, 2, 3]], points = [[1525, -85], [1525, 85], [1695, 85], [1695, -85]]);
					}
				}
			}
			color(c = [0.5000000000, 0.5000000000, 0.5000000000]) {
				translate(v = [0, 0, 2276.1000000000]) {
					linear_extrude(height = 340.0000000000) {
						polygon(paths = [[0, 1, 2, 3]], points = [[1985, -85], [1985, 85], [2155, 85], [2155, -85]]);
					}
				}
			}
			color(c = [0.5000000000, 0.5000000000, 0.5000000000]) {
				translate(v = [0, 0, 2276.1000000000]) {
					linear_extrude(height = 340.0000000000) {
						polygon(paths = [[0, 1, 2, 3]], points = [[2445, -85], [2445, 85], [2615, 85], [2615, -85]]);
					}
				}
			}
			color(c = [0.5000000000, 0.5000000000, 0.5000000000]) {
				translate(v = [0, 0, 2276.1000000000]) {
					linear_extrude(height = 340.0000000000) {
						polygon(paths = [[0, 1, 2, 3]], points = [[2905, -85], [2905, 85], [3075, 85], [3075, -85]]);
					}
				}
			}
			color(c = [0.5000000000, 0.5000000000, 0.5000000000]) {
				translate(v = [0, 0, 2276.1000000000]) {
					linear_extrude(height = 340.0000000000) {
						polygon(paths = [[0, 1, 2, 3]], points = [[145, 2635], [145, 2805], [315, 2805], [315, 2635]]);
					}
				}
			}
			color(c = [0.5000000000, 0.5000000000, 0.5000000000]) {
				translate(v = [0, 0, 2276.1000000000]) {
					linear_extrude(height = 340.0000000000) {
						polygon(paths = [[0, 1, 2, 3]], points = [[605, 2635], [605, 2805], [775, 2805], [775, 2635]]);
					}
				}
			}
			color(c = [0.5000000000, 0.5000000000, 0.5000000000]) {
				translate(v = [0, 0, 2276.1000000000]) {
					linear_extrude(height = 340.0000000000) {
						polygon(paths = [[0, 1, 2, 3]], points = [[1065, 2635], [1065, 2805], [1235, 2805], [1235, 2635]]);
					}
				}
			}
			color(c = [0.5000000000, 0.5000000000, 0.5000000000]) {
				translate(v = [0, 0, 2276.1000000000]) {
					linear_extrude(height = 340.0000000000) {
						polygon(paths = [[0, 1, 2, 3]], points = [[1525, 2635], [1525, 2805], [1695, 2805], [1695, 2635]]);
					}
				}
			}
			color(c = [0.5000000000, 0.5000000000, 0.5000000000]) {
				translate(v = [0, 0, 2276.1000000000]) {
					linear_extrude(height = 340.0000000000) {
						polygon(paths = [[0, 1, 2, 3]], points = [[1985, 2635], [1985, 2805], [2155, 2805], [2155, 2635]]);
					}
				}
			}
			color(c = [0.5000000000, 0.5000000000, 0.5000000000]) {
				translate(v = [0, 0, 2276.1000000000]) {
					linear_extrude(height = 340.0000000000) {
						polygon(paths = [[0, 1, 2, 3]], points = [[2445, 2635], [2445, 2805], [2615, 2805], [2615, 2635]]);
					}
				}
			}
			color(c = [0.5000000000, 0.5000000000, 0.5000000000]) {
				translate(v = [0, 0, 2276.1000000000]) {
					linear_extrude(height = 340.0000000000) {
						polygon(paths = [[0, 1, 2, 3]], points = [[2905, 2635], [2905, 2805], [3075, 2805], [3075, 2635]]);
					}
				}
			}
			color(c = [0.3000000000, 0.3000000000, 1]) {
				translate(v = [0, 0, 2616.1000000000]) {
					linear_extrude(height = 360.0000000000) {
						polygon(paths = [[0, 1, 2, 3]], points = [[0, -240], [0, 240], [3220, 240], [3220, -240]]);
					}
				}
			}
			color(c = [0.3000000000, 0.3000000000, 1]) {
				translate(v = [0, 0, 2616.1000000000]) {
					linear_extrude(height = 360.0000000000) {
						polygon(paths = [[0, 1, 2, 3]], points = [[0, 2480], [0, 2960], [3220, 2960], [3220, 2480]]);
					}
				}
			}
		}
	}
}
